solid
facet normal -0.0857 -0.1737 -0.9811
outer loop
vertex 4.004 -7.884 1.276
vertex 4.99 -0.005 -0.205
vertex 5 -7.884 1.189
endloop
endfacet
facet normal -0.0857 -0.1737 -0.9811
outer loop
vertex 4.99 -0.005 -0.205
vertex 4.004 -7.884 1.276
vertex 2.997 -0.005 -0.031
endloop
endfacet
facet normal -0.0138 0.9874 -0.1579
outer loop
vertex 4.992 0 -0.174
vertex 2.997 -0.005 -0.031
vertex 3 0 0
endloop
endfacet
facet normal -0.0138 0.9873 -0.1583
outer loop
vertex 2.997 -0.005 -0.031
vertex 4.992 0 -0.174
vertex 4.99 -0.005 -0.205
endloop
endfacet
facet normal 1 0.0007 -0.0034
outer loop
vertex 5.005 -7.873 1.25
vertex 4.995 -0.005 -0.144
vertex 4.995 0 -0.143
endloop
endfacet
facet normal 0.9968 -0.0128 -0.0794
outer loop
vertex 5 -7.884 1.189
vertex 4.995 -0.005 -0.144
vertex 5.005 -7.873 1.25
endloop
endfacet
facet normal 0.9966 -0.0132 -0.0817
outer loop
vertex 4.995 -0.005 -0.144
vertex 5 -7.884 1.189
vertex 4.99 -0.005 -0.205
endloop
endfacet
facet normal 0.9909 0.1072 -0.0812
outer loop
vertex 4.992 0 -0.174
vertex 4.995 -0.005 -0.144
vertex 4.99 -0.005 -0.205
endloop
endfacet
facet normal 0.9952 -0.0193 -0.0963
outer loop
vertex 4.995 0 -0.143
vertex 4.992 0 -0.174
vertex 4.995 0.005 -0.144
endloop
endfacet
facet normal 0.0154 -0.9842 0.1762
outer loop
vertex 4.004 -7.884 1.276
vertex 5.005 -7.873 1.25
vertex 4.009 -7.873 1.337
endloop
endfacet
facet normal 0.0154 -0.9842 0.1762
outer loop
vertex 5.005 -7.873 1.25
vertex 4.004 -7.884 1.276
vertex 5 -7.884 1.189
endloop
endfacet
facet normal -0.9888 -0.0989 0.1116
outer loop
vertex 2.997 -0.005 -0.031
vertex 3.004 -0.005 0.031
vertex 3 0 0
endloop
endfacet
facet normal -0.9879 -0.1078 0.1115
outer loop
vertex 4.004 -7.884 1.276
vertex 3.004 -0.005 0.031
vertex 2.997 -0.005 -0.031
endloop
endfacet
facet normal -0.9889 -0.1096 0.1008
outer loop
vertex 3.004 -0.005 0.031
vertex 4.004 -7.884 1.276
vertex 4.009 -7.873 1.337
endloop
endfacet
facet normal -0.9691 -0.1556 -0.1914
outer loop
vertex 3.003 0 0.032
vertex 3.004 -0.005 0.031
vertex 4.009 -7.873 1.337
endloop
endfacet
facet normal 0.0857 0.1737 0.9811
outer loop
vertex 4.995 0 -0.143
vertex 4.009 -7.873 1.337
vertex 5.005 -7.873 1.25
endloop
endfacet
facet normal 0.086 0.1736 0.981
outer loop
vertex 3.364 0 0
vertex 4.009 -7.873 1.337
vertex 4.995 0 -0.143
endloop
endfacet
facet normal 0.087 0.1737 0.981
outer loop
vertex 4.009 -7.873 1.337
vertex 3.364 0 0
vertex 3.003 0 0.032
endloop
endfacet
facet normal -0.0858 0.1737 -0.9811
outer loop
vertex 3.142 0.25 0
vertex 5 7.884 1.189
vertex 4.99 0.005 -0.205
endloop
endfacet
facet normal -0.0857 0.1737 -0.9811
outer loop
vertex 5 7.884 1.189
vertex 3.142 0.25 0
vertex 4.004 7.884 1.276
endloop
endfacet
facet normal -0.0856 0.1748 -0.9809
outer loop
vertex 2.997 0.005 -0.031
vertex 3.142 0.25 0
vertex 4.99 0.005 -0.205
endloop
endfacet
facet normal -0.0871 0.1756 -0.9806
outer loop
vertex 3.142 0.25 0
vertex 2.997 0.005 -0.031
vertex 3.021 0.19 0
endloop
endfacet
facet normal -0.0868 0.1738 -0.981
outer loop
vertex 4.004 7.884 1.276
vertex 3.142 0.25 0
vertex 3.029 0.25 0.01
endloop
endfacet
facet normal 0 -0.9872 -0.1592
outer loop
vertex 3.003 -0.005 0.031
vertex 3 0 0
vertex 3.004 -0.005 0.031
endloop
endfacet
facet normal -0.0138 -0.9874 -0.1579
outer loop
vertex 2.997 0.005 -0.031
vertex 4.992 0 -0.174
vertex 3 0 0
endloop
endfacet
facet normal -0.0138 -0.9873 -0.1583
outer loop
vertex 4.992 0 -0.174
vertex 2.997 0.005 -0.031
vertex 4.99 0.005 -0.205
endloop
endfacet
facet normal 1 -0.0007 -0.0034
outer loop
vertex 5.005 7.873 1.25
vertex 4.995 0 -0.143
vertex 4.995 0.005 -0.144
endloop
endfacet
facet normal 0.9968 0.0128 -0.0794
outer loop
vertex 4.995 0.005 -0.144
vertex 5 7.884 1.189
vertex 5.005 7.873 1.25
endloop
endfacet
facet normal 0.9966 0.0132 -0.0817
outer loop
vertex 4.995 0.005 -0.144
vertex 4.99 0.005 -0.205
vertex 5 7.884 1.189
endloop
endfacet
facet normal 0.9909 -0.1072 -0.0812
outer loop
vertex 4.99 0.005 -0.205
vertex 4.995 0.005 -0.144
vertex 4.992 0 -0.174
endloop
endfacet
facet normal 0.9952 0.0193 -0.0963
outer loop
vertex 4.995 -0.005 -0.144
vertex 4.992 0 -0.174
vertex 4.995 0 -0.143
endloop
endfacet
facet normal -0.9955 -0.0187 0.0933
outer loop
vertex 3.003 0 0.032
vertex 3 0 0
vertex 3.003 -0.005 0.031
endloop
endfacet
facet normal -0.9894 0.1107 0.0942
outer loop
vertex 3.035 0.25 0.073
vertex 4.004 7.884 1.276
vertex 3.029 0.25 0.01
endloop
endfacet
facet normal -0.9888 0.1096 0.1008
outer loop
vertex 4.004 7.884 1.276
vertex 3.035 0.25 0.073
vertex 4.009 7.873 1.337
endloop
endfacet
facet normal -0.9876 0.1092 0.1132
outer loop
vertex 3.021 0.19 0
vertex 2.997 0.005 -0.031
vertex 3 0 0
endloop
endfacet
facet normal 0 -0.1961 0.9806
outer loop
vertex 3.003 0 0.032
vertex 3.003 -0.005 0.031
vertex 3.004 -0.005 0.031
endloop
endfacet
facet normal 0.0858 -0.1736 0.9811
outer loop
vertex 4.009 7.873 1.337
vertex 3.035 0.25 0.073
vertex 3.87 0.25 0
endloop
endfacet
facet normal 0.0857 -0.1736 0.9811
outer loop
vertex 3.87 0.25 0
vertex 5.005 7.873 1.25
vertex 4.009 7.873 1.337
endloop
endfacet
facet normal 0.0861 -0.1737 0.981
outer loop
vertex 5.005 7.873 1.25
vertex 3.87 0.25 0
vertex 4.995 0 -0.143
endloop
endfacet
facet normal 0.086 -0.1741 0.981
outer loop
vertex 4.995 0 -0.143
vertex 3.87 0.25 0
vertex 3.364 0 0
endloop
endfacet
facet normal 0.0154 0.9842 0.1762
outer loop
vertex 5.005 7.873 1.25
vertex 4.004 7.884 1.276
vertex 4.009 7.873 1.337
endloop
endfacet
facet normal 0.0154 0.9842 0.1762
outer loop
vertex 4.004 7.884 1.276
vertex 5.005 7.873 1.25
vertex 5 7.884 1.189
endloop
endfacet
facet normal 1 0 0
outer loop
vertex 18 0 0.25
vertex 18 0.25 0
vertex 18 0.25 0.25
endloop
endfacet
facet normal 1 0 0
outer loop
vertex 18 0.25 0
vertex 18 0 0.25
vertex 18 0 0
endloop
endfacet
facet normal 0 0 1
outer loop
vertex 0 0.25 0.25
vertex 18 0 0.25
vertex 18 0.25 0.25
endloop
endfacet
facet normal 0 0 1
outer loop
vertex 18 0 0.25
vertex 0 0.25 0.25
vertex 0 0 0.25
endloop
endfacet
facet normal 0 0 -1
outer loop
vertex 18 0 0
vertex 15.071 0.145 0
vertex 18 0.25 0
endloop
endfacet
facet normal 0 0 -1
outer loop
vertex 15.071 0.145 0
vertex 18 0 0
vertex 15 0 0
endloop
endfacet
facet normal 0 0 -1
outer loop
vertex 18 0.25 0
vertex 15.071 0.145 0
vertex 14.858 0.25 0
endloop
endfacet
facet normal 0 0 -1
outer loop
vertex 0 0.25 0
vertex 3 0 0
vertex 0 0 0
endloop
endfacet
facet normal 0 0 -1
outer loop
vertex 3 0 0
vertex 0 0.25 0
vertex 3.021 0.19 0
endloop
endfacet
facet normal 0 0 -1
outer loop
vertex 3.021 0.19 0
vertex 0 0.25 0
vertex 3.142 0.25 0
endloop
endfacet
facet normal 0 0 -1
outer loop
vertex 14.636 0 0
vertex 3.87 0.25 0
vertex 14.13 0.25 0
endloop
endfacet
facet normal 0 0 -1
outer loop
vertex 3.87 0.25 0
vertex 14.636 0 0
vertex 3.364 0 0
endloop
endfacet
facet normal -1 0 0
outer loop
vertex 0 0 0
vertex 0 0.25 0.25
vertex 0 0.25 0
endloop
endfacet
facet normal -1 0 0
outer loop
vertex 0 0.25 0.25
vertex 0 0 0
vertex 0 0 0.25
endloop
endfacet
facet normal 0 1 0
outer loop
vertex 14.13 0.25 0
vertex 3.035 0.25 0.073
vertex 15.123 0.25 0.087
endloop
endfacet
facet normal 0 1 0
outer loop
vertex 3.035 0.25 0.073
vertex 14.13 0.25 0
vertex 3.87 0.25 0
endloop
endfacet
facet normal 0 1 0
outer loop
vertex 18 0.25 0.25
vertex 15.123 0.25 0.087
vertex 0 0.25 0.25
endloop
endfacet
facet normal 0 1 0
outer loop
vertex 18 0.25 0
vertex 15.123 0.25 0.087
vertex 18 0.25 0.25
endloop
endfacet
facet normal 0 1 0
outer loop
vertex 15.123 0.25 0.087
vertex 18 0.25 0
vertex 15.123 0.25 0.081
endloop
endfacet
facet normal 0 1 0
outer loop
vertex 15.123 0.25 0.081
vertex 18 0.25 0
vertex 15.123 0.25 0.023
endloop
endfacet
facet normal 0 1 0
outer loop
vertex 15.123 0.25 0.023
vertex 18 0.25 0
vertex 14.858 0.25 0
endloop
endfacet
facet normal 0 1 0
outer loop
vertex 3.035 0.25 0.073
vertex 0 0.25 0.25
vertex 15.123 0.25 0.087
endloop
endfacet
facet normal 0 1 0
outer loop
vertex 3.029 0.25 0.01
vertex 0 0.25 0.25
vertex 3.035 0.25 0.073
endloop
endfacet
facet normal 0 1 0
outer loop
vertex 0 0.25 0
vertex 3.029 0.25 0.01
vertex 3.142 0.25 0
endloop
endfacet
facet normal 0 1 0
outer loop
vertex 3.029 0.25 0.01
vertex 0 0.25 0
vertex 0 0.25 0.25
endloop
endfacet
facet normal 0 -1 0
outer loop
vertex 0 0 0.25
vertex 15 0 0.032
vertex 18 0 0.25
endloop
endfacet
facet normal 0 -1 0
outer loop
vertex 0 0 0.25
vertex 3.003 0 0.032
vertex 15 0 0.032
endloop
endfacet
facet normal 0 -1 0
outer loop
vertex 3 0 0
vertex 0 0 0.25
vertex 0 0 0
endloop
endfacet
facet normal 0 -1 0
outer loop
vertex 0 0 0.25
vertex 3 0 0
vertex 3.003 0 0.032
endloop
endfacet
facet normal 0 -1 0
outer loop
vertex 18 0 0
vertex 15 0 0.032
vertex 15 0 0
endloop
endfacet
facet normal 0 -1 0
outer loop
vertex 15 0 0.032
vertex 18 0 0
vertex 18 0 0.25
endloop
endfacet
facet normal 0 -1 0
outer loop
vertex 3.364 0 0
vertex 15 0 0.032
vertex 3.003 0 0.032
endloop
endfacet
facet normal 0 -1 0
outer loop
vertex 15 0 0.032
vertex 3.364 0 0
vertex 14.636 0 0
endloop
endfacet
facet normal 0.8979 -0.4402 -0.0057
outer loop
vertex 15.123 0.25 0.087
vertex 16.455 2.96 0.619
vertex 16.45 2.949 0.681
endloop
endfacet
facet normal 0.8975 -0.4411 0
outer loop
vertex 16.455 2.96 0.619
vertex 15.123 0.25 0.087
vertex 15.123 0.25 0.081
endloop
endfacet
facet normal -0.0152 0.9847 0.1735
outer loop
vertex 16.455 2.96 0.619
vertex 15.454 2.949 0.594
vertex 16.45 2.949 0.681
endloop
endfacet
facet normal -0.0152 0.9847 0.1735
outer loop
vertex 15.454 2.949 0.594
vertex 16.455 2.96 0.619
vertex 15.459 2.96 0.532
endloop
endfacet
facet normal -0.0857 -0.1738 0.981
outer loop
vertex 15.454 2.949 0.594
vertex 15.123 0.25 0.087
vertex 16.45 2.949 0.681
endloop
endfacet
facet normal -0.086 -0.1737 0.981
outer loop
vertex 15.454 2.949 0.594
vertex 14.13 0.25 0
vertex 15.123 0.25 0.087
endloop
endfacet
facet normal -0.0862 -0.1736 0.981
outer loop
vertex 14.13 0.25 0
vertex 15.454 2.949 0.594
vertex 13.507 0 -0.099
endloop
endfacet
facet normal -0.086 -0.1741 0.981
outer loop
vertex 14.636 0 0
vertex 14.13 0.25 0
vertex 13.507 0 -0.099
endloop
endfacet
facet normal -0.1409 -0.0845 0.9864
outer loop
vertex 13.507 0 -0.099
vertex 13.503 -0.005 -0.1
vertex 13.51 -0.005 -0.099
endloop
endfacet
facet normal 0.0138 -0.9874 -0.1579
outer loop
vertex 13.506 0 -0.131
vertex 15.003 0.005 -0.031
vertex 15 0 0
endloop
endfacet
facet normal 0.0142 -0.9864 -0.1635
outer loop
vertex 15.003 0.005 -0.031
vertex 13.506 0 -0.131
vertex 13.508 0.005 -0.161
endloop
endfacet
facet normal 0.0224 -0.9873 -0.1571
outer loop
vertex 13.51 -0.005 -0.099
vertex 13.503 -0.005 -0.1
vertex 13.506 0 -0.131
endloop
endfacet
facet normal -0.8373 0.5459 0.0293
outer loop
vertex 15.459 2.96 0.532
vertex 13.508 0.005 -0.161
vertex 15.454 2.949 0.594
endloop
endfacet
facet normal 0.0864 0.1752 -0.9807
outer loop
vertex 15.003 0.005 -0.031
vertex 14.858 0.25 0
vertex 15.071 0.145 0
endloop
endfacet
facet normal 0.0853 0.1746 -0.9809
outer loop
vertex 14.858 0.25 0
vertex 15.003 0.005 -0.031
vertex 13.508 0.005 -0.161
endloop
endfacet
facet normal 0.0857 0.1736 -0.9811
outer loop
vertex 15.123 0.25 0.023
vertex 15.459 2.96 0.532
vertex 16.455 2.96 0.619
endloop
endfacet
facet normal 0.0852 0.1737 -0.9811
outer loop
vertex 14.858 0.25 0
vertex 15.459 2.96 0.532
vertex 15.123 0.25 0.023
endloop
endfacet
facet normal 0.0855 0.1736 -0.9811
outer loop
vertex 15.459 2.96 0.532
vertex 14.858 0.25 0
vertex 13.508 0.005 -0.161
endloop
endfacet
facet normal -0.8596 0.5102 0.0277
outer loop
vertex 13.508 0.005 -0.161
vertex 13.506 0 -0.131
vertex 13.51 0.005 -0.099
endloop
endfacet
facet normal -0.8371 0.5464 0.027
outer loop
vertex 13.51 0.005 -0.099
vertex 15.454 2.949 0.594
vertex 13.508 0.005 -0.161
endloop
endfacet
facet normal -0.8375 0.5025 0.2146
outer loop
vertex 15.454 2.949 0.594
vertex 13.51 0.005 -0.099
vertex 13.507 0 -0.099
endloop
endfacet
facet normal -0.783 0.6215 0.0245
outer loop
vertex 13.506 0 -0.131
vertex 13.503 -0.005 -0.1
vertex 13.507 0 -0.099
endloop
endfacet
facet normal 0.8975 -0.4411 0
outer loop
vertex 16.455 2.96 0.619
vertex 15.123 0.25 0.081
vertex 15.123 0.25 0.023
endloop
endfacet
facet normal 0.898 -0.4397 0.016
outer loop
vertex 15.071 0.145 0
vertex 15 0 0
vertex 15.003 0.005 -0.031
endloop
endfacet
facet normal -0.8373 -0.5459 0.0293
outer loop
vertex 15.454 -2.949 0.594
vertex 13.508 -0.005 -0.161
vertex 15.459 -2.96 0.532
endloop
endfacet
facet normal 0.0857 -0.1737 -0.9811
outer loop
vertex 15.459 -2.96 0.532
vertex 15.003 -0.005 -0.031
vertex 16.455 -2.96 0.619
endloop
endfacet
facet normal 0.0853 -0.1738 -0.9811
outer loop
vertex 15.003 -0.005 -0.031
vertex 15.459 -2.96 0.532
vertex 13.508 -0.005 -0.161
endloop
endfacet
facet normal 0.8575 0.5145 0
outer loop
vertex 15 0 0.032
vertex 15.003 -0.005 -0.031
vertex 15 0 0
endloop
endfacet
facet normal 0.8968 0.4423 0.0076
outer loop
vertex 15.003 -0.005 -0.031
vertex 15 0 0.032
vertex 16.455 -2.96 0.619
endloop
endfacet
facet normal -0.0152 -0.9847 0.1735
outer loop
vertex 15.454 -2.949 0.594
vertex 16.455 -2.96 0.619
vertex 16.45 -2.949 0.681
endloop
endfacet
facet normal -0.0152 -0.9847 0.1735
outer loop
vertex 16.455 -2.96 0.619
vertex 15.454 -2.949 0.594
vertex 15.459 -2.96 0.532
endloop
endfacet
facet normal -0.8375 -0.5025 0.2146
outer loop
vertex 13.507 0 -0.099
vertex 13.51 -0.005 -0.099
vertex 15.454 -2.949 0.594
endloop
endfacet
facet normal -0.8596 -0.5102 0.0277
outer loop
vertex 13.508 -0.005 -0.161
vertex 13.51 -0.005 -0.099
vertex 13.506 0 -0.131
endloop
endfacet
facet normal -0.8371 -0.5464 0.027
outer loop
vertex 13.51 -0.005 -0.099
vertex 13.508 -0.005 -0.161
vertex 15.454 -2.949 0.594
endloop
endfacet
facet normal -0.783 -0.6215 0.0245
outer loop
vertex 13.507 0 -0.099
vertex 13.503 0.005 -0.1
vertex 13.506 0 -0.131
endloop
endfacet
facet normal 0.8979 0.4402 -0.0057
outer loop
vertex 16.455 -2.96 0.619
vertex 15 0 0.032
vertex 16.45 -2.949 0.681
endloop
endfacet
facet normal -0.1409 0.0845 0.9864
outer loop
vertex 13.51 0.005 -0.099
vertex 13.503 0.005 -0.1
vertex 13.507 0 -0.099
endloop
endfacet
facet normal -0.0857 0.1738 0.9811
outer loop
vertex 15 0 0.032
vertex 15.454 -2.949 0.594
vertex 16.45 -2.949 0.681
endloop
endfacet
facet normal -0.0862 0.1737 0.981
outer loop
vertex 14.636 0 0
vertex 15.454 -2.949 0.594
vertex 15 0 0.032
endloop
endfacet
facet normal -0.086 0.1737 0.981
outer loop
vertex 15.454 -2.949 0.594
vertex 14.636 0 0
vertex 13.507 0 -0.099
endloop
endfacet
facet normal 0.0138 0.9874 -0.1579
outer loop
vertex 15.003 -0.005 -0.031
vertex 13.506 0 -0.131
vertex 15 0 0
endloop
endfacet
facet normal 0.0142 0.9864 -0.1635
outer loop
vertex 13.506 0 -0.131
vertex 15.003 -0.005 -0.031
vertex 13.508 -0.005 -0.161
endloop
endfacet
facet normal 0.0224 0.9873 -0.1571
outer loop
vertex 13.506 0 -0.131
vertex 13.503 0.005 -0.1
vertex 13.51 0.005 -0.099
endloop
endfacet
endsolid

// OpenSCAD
$fn = 480;

union() {
	union() {
		cube(size = [18, 0.2500000000, 0.2500000000]);
		translate(v = [3, 0, 0]) {
			rotate(a = [5, 0, 90]) {
				rotate(a = [0, 10, 0]) {
					linear_extrude(center = true, convexity = 0, height = 0.0625000000, twist = 0) {
						polygon(paths = [[0, 1, 2, 3]], points = [[0, 0], [-8, -0.8885280531], [-8, -1.8885280531], [0, -2]]);
					}
				}
				rotate(a = [0, -10, 0]) {
					linear_extrude(center = true, convexity = 0, height = 0.0625000000, twist = 0) {
						polygon(paths = [[0, 1, 2, 3]], points = [[0, 0], [8, -0.8885280531], [8, -1.8885280531], [0, -2]]);
					}
				}
			}
		}
	}
	translate(v = [15, 0, 0]) {
		rotate(a = [5, 0, -90]) {
			rotate(a = [0, 10, 0]) {
				linear_extrude(center = true, convexity = 0, height = 0.0625000000, twist = 0) {
					polygon(paths = [[0, 1, 2, 3]], points = [[0, 0], [-3, 1.5036083501], [-3, 0.5036083501], [0, -1.5000000000]]);
				}
			}
			rotate(a = [0, -10, 0]) {
				linear_extrude(center = true, convexity = 0, height = 0.0625000000, twist = 0) {
					polygon(paths = [[0, 1, 2, 3]], points = [[0, 0], [3, 1.5036083501], [3, 0.5036083501], [0, -1.5000000000]]);
				}
			}
		}
	}
}
/***********************************************
*********      SolidPython code:      **********
************************************************
 
#! /usr/bin/env python
# -*- coding: UTF-8 -*-
from __future__ import division
import os
import sys
import re
from solid import *
import solid.utils
import math

SEGMENTS = 480

def glider(canardWingSpan,canardWingTipChord,canardWingRootChord,canardWingSweepAngle,canardWingDihedralAngle,canardWingXPos,canardWingAngleOfAttack,
           mainWingSpan,mainWingTipChord,mainWingRootChord,mainWingSweepAngle,mainWingDihedralAngle,mainWingXPos,mainWingAngleOfAttack,
           fuselageLength,fuselageWidth):

    def generateWing(Span,TipChord,RootChord,SweepAngle,DihedralAngle,flip):
        #forwardLeft = [0,0,0] #starts from the origin #forwardRight = [0+Span,0-Span/tan(SweepAngle),0]
        #backwardLeft = [0,0-RootChord,0] #backwardRight = [0+Span,0-Span/tan(SweepAngle)-TipChord,0]
        #linear_extrude(height = 1/16, center = true, convexity = 10, twist = 0)
        if flip == True:
            points=[[0,0],[0+Span,0-Span/math.tan(90-SweepAngle)],[0+Span,0-Span/math.tan(90-SweepAngle)-TipChord],[0,0-RootChord]]
        else:
            points=[[0,0],[0-Span,0-Span/math.tan(90-SweepAngle)],[0-Span,0-Span/math.tan(90-SweepAngle)-TipChord],[0,0-RootChord]]

        return polygon(points)

    #drawing the fuselage
    final = cube([fuselageLength,fuselageWidth,fuselageWidth])

    mainWings = translate([mainWingXPos,0,0])(
                     rotate([mainWingAngleOfAttack,0,90])
                        (
                        rotate([0,mainWingDihedralAngle,0])
                            (linear_extrude(1/16,True,0,0)
                                (generateWing(mainWingSpan,mainWingTipChord,mainWingRootChord,mainWingSweepAngle,mainWingDihedralAngle,False))),
                        rotate([0,-mainWingDihedralAngle,0])
                            (linear_extrude(1/16,True,0,0)
                                (generateWing(mainWingSpan,mainWingTipChord,mainWingRootChord,mainWingSweepAngle,mainWingDihedralAngle,True)))
                        ))

    canardWings = translate([canardWingXPos,0,0])(
                         rotate([canardWingAngleOfAttack,0,-90])
                            (
                            rotate([0,canardWingDihedralAngle,0])(linear_extrude(1/16,True,0,0)(generateWing(canardWingSpan,canardWingTipChord,canardWingRootChord,canardWingSweepAngle,canardWingDihedralAngle,False))),
                            rotate([0,-canardWingDihedralAngle,0])(linear_extrude(1/16,True,0,0)(generateWing(canardWingSpan,canardWingTipChord,canardWingRootChord,canardWingSweepAngle,canardWingDihedralAngle,True)))
                            ))

    #final = final + mainWings
    final = final + mainWings + canardWings
    return final

if __name__ == '__main__':
    out_dir = sys.argv[1] if len(sys.argv) > 1 else os.curdir
    file_out = os.path.join(out_dir, 'gliderFinal.scad')

    # for canard of aircraft
    canardWingSpan = 3
    canardWingTipChord = 1
    canardWingRootChord = 1.5
    canardWingSweepAngle = 0
    canardWingDihedralAngle = 10
    canardWingXPos = 15
    canardWingAngleOfAttack = 5

    #for Main wing of aircraft
    mainWingSpan = 8
    mainWingTipChord = 1
    mainWingRootChord = 2
    mainWingSweepAngle = 10
    mainWingDihedralAngle = 10
    mainWingXPos = 3 #Yes, yes, I know it's negative, big fucking brohaha.
    mainWingAngleOfAttack = 5

    # for fuselage of Aircraft
    fuselageLength = 18
    fuselageWidth = 0.25



    a = glider(canardWingSpan,canardWingTipChord,canardWingRootChord,
               canardWingSweepAngle,canardWingDihedralAngle,
               canardWingXPos,canardWingAngleOfAttack,
               mainWingSpan,mainWingTipChord,mainWingRootChord,
               mainWingSweepAngle,mainWingDihedralAngle,
               mainWingXPos,mainWingAngleOfAttack,
               fuselageLength,fuselageWidth)


    print("%(__file__)s: SCAD file written to: \n%(file_out)s" % vars())

    # Adding the file_header argument as shown allows you to change
    # the detail of arcs by changing the SEGMENTS variable.  This can
    # be expensive when making lots of small curves, but is otherwise
    # useful.
    scad_render_to_file(a, file_out, file_header='$fn = %s;' % SEGMENTS)
 
 
************************************************/
